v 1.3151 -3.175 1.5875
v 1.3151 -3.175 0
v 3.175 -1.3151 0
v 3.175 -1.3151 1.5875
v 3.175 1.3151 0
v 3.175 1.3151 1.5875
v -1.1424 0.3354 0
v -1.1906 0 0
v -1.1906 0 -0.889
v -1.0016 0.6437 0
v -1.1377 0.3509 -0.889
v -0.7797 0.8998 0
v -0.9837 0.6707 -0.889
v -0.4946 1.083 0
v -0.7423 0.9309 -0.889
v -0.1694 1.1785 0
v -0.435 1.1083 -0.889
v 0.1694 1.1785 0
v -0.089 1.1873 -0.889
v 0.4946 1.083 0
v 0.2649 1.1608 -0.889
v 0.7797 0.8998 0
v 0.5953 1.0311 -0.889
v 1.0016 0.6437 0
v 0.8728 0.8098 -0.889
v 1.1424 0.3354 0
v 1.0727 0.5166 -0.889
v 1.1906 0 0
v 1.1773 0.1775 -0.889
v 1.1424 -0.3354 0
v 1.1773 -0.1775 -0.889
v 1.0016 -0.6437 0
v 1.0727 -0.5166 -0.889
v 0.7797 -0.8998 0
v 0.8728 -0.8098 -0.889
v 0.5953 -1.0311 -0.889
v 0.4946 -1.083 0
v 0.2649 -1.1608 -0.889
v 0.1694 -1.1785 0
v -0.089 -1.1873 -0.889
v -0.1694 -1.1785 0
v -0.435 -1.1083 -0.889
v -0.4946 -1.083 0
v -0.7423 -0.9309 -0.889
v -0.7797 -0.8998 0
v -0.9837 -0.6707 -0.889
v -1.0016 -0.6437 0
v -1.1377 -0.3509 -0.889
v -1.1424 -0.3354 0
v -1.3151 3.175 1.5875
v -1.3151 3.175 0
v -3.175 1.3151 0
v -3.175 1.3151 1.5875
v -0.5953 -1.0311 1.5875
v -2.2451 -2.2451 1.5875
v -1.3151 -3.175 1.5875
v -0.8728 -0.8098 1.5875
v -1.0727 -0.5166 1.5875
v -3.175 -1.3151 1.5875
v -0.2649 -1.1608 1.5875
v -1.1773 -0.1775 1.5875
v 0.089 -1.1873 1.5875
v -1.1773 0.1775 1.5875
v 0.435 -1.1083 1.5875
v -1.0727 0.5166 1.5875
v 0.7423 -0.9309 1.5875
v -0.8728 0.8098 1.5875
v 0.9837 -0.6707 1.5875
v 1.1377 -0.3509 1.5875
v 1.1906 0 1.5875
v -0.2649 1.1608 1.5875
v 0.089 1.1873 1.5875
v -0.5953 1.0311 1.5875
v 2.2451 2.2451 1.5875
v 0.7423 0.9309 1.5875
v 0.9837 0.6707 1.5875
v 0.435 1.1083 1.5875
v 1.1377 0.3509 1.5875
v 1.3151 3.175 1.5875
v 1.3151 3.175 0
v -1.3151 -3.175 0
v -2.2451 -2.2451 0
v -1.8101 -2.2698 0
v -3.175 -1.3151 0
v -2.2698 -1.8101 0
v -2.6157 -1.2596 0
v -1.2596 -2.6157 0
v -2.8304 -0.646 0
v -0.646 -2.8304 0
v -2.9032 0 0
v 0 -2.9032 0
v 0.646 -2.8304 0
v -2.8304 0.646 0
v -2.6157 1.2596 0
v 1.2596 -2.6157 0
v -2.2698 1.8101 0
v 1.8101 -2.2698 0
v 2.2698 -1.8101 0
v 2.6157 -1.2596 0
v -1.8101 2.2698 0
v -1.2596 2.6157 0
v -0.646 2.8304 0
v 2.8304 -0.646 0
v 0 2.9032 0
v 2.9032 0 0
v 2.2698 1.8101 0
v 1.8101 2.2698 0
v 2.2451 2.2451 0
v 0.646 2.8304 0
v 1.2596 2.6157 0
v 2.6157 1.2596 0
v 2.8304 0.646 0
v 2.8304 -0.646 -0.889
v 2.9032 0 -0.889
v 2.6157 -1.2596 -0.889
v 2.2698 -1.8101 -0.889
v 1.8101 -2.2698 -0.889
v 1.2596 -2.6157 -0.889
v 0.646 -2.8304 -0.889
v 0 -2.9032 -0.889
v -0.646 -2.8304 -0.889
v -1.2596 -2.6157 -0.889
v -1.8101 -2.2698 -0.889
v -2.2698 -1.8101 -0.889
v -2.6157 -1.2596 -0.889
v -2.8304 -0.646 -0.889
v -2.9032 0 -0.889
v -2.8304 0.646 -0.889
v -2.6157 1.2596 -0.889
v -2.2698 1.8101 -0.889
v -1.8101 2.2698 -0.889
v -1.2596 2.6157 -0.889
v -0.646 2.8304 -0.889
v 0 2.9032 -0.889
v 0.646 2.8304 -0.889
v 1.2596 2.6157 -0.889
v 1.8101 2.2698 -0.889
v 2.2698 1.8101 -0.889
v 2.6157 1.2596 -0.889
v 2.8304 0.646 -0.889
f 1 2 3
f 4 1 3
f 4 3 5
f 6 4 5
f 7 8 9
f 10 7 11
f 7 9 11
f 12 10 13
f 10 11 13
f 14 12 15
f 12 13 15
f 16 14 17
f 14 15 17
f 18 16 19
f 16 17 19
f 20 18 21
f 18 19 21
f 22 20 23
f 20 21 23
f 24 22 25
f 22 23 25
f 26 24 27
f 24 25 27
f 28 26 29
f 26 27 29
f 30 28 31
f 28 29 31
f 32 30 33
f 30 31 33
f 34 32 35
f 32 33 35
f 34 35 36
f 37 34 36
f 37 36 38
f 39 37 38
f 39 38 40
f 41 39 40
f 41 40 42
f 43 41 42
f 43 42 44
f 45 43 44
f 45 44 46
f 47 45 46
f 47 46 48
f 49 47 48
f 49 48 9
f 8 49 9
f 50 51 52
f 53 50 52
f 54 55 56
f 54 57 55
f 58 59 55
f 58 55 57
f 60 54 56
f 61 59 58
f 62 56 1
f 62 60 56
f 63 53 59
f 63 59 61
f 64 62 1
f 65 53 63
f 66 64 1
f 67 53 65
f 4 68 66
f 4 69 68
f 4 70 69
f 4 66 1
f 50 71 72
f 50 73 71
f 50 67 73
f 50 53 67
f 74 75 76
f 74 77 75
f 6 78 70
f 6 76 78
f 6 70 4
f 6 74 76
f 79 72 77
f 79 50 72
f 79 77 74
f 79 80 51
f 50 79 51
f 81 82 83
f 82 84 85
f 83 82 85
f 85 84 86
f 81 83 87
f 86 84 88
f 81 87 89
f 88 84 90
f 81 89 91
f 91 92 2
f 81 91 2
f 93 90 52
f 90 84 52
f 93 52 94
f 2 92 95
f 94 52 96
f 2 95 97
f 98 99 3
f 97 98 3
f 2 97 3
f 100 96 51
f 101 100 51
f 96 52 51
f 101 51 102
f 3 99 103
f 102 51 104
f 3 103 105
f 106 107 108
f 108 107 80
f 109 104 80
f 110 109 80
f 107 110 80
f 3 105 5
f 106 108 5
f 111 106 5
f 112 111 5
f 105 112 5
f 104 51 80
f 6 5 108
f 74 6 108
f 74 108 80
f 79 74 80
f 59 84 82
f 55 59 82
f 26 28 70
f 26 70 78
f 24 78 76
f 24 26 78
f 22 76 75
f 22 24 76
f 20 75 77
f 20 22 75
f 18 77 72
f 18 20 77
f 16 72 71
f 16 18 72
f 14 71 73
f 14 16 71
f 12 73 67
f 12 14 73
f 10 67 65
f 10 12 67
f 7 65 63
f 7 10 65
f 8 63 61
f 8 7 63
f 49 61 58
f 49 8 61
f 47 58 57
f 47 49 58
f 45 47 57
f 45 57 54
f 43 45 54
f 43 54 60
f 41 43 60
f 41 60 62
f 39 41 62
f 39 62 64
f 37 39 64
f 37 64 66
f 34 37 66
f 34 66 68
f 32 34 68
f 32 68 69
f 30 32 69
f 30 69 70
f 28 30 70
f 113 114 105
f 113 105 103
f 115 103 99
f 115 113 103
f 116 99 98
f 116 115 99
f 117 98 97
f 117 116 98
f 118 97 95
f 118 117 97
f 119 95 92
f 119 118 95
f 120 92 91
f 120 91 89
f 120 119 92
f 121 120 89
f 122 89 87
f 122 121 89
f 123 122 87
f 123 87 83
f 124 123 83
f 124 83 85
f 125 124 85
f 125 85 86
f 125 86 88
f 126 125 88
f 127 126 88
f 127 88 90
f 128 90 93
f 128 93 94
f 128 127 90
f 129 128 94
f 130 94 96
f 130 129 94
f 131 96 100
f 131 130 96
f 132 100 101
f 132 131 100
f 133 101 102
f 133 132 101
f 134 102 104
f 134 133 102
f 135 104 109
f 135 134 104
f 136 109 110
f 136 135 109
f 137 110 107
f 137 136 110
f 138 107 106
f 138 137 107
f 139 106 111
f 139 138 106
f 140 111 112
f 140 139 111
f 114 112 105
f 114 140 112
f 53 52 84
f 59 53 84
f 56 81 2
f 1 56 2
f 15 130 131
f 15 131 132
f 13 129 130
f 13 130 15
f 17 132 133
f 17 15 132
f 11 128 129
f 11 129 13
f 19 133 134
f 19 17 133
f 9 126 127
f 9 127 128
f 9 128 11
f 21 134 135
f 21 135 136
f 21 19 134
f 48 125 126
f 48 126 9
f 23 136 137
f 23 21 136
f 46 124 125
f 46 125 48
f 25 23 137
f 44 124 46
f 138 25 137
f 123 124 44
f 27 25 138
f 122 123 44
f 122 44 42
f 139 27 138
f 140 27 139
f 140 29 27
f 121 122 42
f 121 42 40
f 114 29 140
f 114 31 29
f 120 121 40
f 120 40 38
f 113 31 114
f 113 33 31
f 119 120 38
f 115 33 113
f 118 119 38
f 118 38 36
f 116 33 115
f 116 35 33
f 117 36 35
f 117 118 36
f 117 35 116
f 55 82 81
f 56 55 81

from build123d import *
from build123d.topology import SkipClean

# Parameters (mm, degrees)
SKETCH1_R           = 3.175
SKETCH1_R_2         = 1.190625
BOSS_EXTRUDE1_DEPTH = 1.5875
BOSS_EXTRUDE2_START = 0.889
SKETCH2_R           = 2.903167089
SKETCH2_R_2         = 1.190625
BOSS_EXTRUDE2_DEPTH = 0.889


with BuildPart() as part:
    # Sketch1 → Boss-Extrude1 (new body)
    # profile 1 of 9: a face of its own
    with BuildSketch(Plane.XY):
        Circle(SKETCH1_R)
        Circle(SKETCH1_R_2, mode=Mode.SUBTRACT)
    # profile 2 of 9: a face of its own
    with BuildSketch(Plane.XY):
        with BuildLine():
            Line((0, 3.175), (-1.315128061, 3.175))
            Line((-1.315128061, 3.175), (-2.245064028, 2.245064033))
            ThreePointArc((-2.245064028, 2.245064033), (-1.215019896, 2.933317516), (0, 3.175))
        make_face()
    # profile 3 of 9: a face of its own
    with BuildSketch(Plane.XY):
        with BuildLine():
            Line((1.315128061, 3.175), (0, 3.175))
            ThreePointArc((0, 3.175), (1.215019907, 2.933317512), (2.245064044, 2.245064016))
            Line((2.245064044, 2.245064016), (1.315128061, 3.175))
        make_face()
    # profile 4 of 9: a face of its own
    with BuildSketch(Plane.XY):
        with BuildLine():
            Line((3.175, 1.315128061), (2.245064044, 2.245064016))
            ThreePointArc((2.245064044, 2.245064016), (2.933317519, 1.215019889), (3.175, 0))
            Line((3.175, 0), (3.175, 1.315128061))
        make_face()
    # profile 5 of 9: a face of its own
    with BuildSketch(Plane.XY):
        with BuildLine():
            Line((3.175, -1.315128061), (3.175, 0))
            ThreePointArc((3.175, 0), (2.933317516, -1.215019896), (2.245064033, -2.245064028))
            Line((2.245064033, -2.245064028), (3.175, -1.315128061))
        make_face()
    # profile 6 of 9: a face of its own
    with BuildSketch(Plane.XY):
        with BuildLine():
            Line((1.315128061, -3.175), (2.245064033, -2.245064028))
            ThreePointArc((2.245064033, -2.245064028), (1.215019894, -2.933317517), (-1.2e-08, -3.175))
            Line((-1.2e-08, -3.175), (1.315128061, -3.175))
        make_face()
    # profile 7 of 9: a face of its own
    with BuildSketch(Plane.XY):
        with BuildLine():
            ThreePointArc((-1.2e-08, -3.175), (-1.215019897, -2.933317516), (-2.245064021, -2.245064039))
            Line((-2.245064021, -2.245064039), (-1.315128061, -3.175))
            Line((-1.315128061, -3.175), (-1.2e-08, -3.175))
        make_face()
    # profile 8 of 9: a face of its own
    with BuildSketch(Plane.XY):
        with BuildLine():
            ThreePointArc((-2.245064021, -2.245064039), (-2.933317513, -1.215019904), (-3.175, 0))
            Line((-3.175, 0), (-3.175, -1.315128061))
            Line((-3.175, -1.315128061), (-2.245064021, -2.245064039))
        make_face()
    # profile 9 of 9: a face of its own
    with BuildSketch(Plane.XY):
        with BuildLine():
            ThreePointArc((-3.175, 0), (-2.933317515, 1.215019899), (-2.245064028, 2.245064033))
            Line((-2.245064028, 2.245064033), (-3.175, 1.315128061))
            Line((-3.175, 1.315128061), (-3.175, 0))
        make_face()
    extrude(amount=BOSS_EXTRUDE1_DEPTH)

    # Sketch2 → Boss-Extrude2 (add)
    with SkipClean():  # the faces are left unmerged after this step: merging them gives an invalid solid
        with BuildSketch(Plane(origin=(0, 0, 0), x_dir=(-1, 0, 0), z_dir=(0, 0, -1)).offset(BOSS_EXTRUDE2_START)):
            with Locations(Location((0, 0, 0), (0, 0, 180))):
                Circle(SKETCH2_R)
            Circle(SKETCH2_R_2, mode=Mode.SUBTRACT)
        extrude(amount=-BOSS_EXTRUDE2_DEPTH)


solid = part.part
